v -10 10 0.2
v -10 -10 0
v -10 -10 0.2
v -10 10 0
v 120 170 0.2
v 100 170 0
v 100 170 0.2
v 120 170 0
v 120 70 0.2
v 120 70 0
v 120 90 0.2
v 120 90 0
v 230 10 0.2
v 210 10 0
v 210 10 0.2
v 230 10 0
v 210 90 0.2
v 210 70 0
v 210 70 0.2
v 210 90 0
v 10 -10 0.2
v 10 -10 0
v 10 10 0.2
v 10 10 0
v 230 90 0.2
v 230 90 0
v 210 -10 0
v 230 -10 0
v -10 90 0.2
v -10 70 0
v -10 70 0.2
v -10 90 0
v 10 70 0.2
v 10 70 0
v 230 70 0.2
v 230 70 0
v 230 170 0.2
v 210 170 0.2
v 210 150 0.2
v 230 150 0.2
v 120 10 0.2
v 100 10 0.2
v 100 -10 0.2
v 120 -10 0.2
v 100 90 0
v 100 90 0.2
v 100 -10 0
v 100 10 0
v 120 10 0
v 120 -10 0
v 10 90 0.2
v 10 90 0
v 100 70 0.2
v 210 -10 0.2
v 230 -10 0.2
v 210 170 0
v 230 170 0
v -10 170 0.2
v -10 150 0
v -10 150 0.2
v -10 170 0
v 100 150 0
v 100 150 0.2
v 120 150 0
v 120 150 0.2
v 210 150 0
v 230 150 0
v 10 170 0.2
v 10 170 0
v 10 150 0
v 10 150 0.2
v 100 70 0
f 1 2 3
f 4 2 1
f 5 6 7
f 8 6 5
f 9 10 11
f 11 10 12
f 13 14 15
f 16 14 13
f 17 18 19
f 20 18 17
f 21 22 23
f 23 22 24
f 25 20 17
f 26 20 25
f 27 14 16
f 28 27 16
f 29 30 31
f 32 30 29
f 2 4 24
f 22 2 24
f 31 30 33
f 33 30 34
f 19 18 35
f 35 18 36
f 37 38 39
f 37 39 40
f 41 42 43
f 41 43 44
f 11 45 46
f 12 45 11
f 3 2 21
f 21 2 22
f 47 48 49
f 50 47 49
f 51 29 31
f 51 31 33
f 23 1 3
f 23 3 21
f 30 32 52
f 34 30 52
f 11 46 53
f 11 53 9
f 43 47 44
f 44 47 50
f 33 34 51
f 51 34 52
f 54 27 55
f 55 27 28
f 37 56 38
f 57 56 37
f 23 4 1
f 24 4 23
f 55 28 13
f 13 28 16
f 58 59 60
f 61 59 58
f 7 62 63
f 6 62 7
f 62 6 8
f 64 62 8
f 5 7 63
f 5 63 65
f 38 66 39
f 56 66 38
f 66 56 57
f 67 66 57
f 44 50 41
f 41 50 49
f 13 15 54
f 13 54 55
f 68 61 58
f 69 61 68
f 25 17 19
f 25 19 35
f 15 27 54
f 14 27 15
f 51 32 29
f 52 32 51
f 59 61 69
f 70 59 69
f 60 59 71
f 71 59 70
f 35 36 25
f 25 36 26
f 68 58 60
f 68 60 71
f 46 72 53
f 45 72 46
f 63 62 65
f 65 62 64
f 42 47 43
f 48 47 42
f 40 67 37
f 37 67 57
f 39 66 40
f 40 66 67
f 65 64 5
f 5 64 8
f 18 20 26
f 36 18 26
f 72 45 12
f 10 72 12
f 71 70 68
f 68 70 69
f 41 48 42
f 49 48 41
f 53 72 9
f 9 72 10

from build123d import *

# Parameters (mm, degrees)
F0_W     = 20
F0_H     = 20
F1_DEPTH = 0.2


with BuildPart() as f1:
    # F0 (on Top) → F1 (new body)
    with BuildSketch(Plane.XY):
        Rectangle(F0_W, F0_H)
        with Locations((0, 80)):
            Rectangle(F0_W, F0_H)
        with Locations((0, 160)):
            Rectangle(F0_W, F0_H)
        with Locations((110, 0)):
            Rectangle(F0_W, F0_H)
        with Locations((110, 80)):
            Rectangle(F0_W, F0_H)
        with Locations((110, 160)):
            Rectangle(F0_W, F0_H)
        with Locations((220, 0)):
            Rectangle(F0_W, F0_H)
        with Locations((220, 80)):
            Rectangle(F0_W, F0_H)
        with Locations((220, 160)):
            Rectangle(F0_W, F0_H)
    extrude(amount=F1_DEPTH)


solid = f1.part
